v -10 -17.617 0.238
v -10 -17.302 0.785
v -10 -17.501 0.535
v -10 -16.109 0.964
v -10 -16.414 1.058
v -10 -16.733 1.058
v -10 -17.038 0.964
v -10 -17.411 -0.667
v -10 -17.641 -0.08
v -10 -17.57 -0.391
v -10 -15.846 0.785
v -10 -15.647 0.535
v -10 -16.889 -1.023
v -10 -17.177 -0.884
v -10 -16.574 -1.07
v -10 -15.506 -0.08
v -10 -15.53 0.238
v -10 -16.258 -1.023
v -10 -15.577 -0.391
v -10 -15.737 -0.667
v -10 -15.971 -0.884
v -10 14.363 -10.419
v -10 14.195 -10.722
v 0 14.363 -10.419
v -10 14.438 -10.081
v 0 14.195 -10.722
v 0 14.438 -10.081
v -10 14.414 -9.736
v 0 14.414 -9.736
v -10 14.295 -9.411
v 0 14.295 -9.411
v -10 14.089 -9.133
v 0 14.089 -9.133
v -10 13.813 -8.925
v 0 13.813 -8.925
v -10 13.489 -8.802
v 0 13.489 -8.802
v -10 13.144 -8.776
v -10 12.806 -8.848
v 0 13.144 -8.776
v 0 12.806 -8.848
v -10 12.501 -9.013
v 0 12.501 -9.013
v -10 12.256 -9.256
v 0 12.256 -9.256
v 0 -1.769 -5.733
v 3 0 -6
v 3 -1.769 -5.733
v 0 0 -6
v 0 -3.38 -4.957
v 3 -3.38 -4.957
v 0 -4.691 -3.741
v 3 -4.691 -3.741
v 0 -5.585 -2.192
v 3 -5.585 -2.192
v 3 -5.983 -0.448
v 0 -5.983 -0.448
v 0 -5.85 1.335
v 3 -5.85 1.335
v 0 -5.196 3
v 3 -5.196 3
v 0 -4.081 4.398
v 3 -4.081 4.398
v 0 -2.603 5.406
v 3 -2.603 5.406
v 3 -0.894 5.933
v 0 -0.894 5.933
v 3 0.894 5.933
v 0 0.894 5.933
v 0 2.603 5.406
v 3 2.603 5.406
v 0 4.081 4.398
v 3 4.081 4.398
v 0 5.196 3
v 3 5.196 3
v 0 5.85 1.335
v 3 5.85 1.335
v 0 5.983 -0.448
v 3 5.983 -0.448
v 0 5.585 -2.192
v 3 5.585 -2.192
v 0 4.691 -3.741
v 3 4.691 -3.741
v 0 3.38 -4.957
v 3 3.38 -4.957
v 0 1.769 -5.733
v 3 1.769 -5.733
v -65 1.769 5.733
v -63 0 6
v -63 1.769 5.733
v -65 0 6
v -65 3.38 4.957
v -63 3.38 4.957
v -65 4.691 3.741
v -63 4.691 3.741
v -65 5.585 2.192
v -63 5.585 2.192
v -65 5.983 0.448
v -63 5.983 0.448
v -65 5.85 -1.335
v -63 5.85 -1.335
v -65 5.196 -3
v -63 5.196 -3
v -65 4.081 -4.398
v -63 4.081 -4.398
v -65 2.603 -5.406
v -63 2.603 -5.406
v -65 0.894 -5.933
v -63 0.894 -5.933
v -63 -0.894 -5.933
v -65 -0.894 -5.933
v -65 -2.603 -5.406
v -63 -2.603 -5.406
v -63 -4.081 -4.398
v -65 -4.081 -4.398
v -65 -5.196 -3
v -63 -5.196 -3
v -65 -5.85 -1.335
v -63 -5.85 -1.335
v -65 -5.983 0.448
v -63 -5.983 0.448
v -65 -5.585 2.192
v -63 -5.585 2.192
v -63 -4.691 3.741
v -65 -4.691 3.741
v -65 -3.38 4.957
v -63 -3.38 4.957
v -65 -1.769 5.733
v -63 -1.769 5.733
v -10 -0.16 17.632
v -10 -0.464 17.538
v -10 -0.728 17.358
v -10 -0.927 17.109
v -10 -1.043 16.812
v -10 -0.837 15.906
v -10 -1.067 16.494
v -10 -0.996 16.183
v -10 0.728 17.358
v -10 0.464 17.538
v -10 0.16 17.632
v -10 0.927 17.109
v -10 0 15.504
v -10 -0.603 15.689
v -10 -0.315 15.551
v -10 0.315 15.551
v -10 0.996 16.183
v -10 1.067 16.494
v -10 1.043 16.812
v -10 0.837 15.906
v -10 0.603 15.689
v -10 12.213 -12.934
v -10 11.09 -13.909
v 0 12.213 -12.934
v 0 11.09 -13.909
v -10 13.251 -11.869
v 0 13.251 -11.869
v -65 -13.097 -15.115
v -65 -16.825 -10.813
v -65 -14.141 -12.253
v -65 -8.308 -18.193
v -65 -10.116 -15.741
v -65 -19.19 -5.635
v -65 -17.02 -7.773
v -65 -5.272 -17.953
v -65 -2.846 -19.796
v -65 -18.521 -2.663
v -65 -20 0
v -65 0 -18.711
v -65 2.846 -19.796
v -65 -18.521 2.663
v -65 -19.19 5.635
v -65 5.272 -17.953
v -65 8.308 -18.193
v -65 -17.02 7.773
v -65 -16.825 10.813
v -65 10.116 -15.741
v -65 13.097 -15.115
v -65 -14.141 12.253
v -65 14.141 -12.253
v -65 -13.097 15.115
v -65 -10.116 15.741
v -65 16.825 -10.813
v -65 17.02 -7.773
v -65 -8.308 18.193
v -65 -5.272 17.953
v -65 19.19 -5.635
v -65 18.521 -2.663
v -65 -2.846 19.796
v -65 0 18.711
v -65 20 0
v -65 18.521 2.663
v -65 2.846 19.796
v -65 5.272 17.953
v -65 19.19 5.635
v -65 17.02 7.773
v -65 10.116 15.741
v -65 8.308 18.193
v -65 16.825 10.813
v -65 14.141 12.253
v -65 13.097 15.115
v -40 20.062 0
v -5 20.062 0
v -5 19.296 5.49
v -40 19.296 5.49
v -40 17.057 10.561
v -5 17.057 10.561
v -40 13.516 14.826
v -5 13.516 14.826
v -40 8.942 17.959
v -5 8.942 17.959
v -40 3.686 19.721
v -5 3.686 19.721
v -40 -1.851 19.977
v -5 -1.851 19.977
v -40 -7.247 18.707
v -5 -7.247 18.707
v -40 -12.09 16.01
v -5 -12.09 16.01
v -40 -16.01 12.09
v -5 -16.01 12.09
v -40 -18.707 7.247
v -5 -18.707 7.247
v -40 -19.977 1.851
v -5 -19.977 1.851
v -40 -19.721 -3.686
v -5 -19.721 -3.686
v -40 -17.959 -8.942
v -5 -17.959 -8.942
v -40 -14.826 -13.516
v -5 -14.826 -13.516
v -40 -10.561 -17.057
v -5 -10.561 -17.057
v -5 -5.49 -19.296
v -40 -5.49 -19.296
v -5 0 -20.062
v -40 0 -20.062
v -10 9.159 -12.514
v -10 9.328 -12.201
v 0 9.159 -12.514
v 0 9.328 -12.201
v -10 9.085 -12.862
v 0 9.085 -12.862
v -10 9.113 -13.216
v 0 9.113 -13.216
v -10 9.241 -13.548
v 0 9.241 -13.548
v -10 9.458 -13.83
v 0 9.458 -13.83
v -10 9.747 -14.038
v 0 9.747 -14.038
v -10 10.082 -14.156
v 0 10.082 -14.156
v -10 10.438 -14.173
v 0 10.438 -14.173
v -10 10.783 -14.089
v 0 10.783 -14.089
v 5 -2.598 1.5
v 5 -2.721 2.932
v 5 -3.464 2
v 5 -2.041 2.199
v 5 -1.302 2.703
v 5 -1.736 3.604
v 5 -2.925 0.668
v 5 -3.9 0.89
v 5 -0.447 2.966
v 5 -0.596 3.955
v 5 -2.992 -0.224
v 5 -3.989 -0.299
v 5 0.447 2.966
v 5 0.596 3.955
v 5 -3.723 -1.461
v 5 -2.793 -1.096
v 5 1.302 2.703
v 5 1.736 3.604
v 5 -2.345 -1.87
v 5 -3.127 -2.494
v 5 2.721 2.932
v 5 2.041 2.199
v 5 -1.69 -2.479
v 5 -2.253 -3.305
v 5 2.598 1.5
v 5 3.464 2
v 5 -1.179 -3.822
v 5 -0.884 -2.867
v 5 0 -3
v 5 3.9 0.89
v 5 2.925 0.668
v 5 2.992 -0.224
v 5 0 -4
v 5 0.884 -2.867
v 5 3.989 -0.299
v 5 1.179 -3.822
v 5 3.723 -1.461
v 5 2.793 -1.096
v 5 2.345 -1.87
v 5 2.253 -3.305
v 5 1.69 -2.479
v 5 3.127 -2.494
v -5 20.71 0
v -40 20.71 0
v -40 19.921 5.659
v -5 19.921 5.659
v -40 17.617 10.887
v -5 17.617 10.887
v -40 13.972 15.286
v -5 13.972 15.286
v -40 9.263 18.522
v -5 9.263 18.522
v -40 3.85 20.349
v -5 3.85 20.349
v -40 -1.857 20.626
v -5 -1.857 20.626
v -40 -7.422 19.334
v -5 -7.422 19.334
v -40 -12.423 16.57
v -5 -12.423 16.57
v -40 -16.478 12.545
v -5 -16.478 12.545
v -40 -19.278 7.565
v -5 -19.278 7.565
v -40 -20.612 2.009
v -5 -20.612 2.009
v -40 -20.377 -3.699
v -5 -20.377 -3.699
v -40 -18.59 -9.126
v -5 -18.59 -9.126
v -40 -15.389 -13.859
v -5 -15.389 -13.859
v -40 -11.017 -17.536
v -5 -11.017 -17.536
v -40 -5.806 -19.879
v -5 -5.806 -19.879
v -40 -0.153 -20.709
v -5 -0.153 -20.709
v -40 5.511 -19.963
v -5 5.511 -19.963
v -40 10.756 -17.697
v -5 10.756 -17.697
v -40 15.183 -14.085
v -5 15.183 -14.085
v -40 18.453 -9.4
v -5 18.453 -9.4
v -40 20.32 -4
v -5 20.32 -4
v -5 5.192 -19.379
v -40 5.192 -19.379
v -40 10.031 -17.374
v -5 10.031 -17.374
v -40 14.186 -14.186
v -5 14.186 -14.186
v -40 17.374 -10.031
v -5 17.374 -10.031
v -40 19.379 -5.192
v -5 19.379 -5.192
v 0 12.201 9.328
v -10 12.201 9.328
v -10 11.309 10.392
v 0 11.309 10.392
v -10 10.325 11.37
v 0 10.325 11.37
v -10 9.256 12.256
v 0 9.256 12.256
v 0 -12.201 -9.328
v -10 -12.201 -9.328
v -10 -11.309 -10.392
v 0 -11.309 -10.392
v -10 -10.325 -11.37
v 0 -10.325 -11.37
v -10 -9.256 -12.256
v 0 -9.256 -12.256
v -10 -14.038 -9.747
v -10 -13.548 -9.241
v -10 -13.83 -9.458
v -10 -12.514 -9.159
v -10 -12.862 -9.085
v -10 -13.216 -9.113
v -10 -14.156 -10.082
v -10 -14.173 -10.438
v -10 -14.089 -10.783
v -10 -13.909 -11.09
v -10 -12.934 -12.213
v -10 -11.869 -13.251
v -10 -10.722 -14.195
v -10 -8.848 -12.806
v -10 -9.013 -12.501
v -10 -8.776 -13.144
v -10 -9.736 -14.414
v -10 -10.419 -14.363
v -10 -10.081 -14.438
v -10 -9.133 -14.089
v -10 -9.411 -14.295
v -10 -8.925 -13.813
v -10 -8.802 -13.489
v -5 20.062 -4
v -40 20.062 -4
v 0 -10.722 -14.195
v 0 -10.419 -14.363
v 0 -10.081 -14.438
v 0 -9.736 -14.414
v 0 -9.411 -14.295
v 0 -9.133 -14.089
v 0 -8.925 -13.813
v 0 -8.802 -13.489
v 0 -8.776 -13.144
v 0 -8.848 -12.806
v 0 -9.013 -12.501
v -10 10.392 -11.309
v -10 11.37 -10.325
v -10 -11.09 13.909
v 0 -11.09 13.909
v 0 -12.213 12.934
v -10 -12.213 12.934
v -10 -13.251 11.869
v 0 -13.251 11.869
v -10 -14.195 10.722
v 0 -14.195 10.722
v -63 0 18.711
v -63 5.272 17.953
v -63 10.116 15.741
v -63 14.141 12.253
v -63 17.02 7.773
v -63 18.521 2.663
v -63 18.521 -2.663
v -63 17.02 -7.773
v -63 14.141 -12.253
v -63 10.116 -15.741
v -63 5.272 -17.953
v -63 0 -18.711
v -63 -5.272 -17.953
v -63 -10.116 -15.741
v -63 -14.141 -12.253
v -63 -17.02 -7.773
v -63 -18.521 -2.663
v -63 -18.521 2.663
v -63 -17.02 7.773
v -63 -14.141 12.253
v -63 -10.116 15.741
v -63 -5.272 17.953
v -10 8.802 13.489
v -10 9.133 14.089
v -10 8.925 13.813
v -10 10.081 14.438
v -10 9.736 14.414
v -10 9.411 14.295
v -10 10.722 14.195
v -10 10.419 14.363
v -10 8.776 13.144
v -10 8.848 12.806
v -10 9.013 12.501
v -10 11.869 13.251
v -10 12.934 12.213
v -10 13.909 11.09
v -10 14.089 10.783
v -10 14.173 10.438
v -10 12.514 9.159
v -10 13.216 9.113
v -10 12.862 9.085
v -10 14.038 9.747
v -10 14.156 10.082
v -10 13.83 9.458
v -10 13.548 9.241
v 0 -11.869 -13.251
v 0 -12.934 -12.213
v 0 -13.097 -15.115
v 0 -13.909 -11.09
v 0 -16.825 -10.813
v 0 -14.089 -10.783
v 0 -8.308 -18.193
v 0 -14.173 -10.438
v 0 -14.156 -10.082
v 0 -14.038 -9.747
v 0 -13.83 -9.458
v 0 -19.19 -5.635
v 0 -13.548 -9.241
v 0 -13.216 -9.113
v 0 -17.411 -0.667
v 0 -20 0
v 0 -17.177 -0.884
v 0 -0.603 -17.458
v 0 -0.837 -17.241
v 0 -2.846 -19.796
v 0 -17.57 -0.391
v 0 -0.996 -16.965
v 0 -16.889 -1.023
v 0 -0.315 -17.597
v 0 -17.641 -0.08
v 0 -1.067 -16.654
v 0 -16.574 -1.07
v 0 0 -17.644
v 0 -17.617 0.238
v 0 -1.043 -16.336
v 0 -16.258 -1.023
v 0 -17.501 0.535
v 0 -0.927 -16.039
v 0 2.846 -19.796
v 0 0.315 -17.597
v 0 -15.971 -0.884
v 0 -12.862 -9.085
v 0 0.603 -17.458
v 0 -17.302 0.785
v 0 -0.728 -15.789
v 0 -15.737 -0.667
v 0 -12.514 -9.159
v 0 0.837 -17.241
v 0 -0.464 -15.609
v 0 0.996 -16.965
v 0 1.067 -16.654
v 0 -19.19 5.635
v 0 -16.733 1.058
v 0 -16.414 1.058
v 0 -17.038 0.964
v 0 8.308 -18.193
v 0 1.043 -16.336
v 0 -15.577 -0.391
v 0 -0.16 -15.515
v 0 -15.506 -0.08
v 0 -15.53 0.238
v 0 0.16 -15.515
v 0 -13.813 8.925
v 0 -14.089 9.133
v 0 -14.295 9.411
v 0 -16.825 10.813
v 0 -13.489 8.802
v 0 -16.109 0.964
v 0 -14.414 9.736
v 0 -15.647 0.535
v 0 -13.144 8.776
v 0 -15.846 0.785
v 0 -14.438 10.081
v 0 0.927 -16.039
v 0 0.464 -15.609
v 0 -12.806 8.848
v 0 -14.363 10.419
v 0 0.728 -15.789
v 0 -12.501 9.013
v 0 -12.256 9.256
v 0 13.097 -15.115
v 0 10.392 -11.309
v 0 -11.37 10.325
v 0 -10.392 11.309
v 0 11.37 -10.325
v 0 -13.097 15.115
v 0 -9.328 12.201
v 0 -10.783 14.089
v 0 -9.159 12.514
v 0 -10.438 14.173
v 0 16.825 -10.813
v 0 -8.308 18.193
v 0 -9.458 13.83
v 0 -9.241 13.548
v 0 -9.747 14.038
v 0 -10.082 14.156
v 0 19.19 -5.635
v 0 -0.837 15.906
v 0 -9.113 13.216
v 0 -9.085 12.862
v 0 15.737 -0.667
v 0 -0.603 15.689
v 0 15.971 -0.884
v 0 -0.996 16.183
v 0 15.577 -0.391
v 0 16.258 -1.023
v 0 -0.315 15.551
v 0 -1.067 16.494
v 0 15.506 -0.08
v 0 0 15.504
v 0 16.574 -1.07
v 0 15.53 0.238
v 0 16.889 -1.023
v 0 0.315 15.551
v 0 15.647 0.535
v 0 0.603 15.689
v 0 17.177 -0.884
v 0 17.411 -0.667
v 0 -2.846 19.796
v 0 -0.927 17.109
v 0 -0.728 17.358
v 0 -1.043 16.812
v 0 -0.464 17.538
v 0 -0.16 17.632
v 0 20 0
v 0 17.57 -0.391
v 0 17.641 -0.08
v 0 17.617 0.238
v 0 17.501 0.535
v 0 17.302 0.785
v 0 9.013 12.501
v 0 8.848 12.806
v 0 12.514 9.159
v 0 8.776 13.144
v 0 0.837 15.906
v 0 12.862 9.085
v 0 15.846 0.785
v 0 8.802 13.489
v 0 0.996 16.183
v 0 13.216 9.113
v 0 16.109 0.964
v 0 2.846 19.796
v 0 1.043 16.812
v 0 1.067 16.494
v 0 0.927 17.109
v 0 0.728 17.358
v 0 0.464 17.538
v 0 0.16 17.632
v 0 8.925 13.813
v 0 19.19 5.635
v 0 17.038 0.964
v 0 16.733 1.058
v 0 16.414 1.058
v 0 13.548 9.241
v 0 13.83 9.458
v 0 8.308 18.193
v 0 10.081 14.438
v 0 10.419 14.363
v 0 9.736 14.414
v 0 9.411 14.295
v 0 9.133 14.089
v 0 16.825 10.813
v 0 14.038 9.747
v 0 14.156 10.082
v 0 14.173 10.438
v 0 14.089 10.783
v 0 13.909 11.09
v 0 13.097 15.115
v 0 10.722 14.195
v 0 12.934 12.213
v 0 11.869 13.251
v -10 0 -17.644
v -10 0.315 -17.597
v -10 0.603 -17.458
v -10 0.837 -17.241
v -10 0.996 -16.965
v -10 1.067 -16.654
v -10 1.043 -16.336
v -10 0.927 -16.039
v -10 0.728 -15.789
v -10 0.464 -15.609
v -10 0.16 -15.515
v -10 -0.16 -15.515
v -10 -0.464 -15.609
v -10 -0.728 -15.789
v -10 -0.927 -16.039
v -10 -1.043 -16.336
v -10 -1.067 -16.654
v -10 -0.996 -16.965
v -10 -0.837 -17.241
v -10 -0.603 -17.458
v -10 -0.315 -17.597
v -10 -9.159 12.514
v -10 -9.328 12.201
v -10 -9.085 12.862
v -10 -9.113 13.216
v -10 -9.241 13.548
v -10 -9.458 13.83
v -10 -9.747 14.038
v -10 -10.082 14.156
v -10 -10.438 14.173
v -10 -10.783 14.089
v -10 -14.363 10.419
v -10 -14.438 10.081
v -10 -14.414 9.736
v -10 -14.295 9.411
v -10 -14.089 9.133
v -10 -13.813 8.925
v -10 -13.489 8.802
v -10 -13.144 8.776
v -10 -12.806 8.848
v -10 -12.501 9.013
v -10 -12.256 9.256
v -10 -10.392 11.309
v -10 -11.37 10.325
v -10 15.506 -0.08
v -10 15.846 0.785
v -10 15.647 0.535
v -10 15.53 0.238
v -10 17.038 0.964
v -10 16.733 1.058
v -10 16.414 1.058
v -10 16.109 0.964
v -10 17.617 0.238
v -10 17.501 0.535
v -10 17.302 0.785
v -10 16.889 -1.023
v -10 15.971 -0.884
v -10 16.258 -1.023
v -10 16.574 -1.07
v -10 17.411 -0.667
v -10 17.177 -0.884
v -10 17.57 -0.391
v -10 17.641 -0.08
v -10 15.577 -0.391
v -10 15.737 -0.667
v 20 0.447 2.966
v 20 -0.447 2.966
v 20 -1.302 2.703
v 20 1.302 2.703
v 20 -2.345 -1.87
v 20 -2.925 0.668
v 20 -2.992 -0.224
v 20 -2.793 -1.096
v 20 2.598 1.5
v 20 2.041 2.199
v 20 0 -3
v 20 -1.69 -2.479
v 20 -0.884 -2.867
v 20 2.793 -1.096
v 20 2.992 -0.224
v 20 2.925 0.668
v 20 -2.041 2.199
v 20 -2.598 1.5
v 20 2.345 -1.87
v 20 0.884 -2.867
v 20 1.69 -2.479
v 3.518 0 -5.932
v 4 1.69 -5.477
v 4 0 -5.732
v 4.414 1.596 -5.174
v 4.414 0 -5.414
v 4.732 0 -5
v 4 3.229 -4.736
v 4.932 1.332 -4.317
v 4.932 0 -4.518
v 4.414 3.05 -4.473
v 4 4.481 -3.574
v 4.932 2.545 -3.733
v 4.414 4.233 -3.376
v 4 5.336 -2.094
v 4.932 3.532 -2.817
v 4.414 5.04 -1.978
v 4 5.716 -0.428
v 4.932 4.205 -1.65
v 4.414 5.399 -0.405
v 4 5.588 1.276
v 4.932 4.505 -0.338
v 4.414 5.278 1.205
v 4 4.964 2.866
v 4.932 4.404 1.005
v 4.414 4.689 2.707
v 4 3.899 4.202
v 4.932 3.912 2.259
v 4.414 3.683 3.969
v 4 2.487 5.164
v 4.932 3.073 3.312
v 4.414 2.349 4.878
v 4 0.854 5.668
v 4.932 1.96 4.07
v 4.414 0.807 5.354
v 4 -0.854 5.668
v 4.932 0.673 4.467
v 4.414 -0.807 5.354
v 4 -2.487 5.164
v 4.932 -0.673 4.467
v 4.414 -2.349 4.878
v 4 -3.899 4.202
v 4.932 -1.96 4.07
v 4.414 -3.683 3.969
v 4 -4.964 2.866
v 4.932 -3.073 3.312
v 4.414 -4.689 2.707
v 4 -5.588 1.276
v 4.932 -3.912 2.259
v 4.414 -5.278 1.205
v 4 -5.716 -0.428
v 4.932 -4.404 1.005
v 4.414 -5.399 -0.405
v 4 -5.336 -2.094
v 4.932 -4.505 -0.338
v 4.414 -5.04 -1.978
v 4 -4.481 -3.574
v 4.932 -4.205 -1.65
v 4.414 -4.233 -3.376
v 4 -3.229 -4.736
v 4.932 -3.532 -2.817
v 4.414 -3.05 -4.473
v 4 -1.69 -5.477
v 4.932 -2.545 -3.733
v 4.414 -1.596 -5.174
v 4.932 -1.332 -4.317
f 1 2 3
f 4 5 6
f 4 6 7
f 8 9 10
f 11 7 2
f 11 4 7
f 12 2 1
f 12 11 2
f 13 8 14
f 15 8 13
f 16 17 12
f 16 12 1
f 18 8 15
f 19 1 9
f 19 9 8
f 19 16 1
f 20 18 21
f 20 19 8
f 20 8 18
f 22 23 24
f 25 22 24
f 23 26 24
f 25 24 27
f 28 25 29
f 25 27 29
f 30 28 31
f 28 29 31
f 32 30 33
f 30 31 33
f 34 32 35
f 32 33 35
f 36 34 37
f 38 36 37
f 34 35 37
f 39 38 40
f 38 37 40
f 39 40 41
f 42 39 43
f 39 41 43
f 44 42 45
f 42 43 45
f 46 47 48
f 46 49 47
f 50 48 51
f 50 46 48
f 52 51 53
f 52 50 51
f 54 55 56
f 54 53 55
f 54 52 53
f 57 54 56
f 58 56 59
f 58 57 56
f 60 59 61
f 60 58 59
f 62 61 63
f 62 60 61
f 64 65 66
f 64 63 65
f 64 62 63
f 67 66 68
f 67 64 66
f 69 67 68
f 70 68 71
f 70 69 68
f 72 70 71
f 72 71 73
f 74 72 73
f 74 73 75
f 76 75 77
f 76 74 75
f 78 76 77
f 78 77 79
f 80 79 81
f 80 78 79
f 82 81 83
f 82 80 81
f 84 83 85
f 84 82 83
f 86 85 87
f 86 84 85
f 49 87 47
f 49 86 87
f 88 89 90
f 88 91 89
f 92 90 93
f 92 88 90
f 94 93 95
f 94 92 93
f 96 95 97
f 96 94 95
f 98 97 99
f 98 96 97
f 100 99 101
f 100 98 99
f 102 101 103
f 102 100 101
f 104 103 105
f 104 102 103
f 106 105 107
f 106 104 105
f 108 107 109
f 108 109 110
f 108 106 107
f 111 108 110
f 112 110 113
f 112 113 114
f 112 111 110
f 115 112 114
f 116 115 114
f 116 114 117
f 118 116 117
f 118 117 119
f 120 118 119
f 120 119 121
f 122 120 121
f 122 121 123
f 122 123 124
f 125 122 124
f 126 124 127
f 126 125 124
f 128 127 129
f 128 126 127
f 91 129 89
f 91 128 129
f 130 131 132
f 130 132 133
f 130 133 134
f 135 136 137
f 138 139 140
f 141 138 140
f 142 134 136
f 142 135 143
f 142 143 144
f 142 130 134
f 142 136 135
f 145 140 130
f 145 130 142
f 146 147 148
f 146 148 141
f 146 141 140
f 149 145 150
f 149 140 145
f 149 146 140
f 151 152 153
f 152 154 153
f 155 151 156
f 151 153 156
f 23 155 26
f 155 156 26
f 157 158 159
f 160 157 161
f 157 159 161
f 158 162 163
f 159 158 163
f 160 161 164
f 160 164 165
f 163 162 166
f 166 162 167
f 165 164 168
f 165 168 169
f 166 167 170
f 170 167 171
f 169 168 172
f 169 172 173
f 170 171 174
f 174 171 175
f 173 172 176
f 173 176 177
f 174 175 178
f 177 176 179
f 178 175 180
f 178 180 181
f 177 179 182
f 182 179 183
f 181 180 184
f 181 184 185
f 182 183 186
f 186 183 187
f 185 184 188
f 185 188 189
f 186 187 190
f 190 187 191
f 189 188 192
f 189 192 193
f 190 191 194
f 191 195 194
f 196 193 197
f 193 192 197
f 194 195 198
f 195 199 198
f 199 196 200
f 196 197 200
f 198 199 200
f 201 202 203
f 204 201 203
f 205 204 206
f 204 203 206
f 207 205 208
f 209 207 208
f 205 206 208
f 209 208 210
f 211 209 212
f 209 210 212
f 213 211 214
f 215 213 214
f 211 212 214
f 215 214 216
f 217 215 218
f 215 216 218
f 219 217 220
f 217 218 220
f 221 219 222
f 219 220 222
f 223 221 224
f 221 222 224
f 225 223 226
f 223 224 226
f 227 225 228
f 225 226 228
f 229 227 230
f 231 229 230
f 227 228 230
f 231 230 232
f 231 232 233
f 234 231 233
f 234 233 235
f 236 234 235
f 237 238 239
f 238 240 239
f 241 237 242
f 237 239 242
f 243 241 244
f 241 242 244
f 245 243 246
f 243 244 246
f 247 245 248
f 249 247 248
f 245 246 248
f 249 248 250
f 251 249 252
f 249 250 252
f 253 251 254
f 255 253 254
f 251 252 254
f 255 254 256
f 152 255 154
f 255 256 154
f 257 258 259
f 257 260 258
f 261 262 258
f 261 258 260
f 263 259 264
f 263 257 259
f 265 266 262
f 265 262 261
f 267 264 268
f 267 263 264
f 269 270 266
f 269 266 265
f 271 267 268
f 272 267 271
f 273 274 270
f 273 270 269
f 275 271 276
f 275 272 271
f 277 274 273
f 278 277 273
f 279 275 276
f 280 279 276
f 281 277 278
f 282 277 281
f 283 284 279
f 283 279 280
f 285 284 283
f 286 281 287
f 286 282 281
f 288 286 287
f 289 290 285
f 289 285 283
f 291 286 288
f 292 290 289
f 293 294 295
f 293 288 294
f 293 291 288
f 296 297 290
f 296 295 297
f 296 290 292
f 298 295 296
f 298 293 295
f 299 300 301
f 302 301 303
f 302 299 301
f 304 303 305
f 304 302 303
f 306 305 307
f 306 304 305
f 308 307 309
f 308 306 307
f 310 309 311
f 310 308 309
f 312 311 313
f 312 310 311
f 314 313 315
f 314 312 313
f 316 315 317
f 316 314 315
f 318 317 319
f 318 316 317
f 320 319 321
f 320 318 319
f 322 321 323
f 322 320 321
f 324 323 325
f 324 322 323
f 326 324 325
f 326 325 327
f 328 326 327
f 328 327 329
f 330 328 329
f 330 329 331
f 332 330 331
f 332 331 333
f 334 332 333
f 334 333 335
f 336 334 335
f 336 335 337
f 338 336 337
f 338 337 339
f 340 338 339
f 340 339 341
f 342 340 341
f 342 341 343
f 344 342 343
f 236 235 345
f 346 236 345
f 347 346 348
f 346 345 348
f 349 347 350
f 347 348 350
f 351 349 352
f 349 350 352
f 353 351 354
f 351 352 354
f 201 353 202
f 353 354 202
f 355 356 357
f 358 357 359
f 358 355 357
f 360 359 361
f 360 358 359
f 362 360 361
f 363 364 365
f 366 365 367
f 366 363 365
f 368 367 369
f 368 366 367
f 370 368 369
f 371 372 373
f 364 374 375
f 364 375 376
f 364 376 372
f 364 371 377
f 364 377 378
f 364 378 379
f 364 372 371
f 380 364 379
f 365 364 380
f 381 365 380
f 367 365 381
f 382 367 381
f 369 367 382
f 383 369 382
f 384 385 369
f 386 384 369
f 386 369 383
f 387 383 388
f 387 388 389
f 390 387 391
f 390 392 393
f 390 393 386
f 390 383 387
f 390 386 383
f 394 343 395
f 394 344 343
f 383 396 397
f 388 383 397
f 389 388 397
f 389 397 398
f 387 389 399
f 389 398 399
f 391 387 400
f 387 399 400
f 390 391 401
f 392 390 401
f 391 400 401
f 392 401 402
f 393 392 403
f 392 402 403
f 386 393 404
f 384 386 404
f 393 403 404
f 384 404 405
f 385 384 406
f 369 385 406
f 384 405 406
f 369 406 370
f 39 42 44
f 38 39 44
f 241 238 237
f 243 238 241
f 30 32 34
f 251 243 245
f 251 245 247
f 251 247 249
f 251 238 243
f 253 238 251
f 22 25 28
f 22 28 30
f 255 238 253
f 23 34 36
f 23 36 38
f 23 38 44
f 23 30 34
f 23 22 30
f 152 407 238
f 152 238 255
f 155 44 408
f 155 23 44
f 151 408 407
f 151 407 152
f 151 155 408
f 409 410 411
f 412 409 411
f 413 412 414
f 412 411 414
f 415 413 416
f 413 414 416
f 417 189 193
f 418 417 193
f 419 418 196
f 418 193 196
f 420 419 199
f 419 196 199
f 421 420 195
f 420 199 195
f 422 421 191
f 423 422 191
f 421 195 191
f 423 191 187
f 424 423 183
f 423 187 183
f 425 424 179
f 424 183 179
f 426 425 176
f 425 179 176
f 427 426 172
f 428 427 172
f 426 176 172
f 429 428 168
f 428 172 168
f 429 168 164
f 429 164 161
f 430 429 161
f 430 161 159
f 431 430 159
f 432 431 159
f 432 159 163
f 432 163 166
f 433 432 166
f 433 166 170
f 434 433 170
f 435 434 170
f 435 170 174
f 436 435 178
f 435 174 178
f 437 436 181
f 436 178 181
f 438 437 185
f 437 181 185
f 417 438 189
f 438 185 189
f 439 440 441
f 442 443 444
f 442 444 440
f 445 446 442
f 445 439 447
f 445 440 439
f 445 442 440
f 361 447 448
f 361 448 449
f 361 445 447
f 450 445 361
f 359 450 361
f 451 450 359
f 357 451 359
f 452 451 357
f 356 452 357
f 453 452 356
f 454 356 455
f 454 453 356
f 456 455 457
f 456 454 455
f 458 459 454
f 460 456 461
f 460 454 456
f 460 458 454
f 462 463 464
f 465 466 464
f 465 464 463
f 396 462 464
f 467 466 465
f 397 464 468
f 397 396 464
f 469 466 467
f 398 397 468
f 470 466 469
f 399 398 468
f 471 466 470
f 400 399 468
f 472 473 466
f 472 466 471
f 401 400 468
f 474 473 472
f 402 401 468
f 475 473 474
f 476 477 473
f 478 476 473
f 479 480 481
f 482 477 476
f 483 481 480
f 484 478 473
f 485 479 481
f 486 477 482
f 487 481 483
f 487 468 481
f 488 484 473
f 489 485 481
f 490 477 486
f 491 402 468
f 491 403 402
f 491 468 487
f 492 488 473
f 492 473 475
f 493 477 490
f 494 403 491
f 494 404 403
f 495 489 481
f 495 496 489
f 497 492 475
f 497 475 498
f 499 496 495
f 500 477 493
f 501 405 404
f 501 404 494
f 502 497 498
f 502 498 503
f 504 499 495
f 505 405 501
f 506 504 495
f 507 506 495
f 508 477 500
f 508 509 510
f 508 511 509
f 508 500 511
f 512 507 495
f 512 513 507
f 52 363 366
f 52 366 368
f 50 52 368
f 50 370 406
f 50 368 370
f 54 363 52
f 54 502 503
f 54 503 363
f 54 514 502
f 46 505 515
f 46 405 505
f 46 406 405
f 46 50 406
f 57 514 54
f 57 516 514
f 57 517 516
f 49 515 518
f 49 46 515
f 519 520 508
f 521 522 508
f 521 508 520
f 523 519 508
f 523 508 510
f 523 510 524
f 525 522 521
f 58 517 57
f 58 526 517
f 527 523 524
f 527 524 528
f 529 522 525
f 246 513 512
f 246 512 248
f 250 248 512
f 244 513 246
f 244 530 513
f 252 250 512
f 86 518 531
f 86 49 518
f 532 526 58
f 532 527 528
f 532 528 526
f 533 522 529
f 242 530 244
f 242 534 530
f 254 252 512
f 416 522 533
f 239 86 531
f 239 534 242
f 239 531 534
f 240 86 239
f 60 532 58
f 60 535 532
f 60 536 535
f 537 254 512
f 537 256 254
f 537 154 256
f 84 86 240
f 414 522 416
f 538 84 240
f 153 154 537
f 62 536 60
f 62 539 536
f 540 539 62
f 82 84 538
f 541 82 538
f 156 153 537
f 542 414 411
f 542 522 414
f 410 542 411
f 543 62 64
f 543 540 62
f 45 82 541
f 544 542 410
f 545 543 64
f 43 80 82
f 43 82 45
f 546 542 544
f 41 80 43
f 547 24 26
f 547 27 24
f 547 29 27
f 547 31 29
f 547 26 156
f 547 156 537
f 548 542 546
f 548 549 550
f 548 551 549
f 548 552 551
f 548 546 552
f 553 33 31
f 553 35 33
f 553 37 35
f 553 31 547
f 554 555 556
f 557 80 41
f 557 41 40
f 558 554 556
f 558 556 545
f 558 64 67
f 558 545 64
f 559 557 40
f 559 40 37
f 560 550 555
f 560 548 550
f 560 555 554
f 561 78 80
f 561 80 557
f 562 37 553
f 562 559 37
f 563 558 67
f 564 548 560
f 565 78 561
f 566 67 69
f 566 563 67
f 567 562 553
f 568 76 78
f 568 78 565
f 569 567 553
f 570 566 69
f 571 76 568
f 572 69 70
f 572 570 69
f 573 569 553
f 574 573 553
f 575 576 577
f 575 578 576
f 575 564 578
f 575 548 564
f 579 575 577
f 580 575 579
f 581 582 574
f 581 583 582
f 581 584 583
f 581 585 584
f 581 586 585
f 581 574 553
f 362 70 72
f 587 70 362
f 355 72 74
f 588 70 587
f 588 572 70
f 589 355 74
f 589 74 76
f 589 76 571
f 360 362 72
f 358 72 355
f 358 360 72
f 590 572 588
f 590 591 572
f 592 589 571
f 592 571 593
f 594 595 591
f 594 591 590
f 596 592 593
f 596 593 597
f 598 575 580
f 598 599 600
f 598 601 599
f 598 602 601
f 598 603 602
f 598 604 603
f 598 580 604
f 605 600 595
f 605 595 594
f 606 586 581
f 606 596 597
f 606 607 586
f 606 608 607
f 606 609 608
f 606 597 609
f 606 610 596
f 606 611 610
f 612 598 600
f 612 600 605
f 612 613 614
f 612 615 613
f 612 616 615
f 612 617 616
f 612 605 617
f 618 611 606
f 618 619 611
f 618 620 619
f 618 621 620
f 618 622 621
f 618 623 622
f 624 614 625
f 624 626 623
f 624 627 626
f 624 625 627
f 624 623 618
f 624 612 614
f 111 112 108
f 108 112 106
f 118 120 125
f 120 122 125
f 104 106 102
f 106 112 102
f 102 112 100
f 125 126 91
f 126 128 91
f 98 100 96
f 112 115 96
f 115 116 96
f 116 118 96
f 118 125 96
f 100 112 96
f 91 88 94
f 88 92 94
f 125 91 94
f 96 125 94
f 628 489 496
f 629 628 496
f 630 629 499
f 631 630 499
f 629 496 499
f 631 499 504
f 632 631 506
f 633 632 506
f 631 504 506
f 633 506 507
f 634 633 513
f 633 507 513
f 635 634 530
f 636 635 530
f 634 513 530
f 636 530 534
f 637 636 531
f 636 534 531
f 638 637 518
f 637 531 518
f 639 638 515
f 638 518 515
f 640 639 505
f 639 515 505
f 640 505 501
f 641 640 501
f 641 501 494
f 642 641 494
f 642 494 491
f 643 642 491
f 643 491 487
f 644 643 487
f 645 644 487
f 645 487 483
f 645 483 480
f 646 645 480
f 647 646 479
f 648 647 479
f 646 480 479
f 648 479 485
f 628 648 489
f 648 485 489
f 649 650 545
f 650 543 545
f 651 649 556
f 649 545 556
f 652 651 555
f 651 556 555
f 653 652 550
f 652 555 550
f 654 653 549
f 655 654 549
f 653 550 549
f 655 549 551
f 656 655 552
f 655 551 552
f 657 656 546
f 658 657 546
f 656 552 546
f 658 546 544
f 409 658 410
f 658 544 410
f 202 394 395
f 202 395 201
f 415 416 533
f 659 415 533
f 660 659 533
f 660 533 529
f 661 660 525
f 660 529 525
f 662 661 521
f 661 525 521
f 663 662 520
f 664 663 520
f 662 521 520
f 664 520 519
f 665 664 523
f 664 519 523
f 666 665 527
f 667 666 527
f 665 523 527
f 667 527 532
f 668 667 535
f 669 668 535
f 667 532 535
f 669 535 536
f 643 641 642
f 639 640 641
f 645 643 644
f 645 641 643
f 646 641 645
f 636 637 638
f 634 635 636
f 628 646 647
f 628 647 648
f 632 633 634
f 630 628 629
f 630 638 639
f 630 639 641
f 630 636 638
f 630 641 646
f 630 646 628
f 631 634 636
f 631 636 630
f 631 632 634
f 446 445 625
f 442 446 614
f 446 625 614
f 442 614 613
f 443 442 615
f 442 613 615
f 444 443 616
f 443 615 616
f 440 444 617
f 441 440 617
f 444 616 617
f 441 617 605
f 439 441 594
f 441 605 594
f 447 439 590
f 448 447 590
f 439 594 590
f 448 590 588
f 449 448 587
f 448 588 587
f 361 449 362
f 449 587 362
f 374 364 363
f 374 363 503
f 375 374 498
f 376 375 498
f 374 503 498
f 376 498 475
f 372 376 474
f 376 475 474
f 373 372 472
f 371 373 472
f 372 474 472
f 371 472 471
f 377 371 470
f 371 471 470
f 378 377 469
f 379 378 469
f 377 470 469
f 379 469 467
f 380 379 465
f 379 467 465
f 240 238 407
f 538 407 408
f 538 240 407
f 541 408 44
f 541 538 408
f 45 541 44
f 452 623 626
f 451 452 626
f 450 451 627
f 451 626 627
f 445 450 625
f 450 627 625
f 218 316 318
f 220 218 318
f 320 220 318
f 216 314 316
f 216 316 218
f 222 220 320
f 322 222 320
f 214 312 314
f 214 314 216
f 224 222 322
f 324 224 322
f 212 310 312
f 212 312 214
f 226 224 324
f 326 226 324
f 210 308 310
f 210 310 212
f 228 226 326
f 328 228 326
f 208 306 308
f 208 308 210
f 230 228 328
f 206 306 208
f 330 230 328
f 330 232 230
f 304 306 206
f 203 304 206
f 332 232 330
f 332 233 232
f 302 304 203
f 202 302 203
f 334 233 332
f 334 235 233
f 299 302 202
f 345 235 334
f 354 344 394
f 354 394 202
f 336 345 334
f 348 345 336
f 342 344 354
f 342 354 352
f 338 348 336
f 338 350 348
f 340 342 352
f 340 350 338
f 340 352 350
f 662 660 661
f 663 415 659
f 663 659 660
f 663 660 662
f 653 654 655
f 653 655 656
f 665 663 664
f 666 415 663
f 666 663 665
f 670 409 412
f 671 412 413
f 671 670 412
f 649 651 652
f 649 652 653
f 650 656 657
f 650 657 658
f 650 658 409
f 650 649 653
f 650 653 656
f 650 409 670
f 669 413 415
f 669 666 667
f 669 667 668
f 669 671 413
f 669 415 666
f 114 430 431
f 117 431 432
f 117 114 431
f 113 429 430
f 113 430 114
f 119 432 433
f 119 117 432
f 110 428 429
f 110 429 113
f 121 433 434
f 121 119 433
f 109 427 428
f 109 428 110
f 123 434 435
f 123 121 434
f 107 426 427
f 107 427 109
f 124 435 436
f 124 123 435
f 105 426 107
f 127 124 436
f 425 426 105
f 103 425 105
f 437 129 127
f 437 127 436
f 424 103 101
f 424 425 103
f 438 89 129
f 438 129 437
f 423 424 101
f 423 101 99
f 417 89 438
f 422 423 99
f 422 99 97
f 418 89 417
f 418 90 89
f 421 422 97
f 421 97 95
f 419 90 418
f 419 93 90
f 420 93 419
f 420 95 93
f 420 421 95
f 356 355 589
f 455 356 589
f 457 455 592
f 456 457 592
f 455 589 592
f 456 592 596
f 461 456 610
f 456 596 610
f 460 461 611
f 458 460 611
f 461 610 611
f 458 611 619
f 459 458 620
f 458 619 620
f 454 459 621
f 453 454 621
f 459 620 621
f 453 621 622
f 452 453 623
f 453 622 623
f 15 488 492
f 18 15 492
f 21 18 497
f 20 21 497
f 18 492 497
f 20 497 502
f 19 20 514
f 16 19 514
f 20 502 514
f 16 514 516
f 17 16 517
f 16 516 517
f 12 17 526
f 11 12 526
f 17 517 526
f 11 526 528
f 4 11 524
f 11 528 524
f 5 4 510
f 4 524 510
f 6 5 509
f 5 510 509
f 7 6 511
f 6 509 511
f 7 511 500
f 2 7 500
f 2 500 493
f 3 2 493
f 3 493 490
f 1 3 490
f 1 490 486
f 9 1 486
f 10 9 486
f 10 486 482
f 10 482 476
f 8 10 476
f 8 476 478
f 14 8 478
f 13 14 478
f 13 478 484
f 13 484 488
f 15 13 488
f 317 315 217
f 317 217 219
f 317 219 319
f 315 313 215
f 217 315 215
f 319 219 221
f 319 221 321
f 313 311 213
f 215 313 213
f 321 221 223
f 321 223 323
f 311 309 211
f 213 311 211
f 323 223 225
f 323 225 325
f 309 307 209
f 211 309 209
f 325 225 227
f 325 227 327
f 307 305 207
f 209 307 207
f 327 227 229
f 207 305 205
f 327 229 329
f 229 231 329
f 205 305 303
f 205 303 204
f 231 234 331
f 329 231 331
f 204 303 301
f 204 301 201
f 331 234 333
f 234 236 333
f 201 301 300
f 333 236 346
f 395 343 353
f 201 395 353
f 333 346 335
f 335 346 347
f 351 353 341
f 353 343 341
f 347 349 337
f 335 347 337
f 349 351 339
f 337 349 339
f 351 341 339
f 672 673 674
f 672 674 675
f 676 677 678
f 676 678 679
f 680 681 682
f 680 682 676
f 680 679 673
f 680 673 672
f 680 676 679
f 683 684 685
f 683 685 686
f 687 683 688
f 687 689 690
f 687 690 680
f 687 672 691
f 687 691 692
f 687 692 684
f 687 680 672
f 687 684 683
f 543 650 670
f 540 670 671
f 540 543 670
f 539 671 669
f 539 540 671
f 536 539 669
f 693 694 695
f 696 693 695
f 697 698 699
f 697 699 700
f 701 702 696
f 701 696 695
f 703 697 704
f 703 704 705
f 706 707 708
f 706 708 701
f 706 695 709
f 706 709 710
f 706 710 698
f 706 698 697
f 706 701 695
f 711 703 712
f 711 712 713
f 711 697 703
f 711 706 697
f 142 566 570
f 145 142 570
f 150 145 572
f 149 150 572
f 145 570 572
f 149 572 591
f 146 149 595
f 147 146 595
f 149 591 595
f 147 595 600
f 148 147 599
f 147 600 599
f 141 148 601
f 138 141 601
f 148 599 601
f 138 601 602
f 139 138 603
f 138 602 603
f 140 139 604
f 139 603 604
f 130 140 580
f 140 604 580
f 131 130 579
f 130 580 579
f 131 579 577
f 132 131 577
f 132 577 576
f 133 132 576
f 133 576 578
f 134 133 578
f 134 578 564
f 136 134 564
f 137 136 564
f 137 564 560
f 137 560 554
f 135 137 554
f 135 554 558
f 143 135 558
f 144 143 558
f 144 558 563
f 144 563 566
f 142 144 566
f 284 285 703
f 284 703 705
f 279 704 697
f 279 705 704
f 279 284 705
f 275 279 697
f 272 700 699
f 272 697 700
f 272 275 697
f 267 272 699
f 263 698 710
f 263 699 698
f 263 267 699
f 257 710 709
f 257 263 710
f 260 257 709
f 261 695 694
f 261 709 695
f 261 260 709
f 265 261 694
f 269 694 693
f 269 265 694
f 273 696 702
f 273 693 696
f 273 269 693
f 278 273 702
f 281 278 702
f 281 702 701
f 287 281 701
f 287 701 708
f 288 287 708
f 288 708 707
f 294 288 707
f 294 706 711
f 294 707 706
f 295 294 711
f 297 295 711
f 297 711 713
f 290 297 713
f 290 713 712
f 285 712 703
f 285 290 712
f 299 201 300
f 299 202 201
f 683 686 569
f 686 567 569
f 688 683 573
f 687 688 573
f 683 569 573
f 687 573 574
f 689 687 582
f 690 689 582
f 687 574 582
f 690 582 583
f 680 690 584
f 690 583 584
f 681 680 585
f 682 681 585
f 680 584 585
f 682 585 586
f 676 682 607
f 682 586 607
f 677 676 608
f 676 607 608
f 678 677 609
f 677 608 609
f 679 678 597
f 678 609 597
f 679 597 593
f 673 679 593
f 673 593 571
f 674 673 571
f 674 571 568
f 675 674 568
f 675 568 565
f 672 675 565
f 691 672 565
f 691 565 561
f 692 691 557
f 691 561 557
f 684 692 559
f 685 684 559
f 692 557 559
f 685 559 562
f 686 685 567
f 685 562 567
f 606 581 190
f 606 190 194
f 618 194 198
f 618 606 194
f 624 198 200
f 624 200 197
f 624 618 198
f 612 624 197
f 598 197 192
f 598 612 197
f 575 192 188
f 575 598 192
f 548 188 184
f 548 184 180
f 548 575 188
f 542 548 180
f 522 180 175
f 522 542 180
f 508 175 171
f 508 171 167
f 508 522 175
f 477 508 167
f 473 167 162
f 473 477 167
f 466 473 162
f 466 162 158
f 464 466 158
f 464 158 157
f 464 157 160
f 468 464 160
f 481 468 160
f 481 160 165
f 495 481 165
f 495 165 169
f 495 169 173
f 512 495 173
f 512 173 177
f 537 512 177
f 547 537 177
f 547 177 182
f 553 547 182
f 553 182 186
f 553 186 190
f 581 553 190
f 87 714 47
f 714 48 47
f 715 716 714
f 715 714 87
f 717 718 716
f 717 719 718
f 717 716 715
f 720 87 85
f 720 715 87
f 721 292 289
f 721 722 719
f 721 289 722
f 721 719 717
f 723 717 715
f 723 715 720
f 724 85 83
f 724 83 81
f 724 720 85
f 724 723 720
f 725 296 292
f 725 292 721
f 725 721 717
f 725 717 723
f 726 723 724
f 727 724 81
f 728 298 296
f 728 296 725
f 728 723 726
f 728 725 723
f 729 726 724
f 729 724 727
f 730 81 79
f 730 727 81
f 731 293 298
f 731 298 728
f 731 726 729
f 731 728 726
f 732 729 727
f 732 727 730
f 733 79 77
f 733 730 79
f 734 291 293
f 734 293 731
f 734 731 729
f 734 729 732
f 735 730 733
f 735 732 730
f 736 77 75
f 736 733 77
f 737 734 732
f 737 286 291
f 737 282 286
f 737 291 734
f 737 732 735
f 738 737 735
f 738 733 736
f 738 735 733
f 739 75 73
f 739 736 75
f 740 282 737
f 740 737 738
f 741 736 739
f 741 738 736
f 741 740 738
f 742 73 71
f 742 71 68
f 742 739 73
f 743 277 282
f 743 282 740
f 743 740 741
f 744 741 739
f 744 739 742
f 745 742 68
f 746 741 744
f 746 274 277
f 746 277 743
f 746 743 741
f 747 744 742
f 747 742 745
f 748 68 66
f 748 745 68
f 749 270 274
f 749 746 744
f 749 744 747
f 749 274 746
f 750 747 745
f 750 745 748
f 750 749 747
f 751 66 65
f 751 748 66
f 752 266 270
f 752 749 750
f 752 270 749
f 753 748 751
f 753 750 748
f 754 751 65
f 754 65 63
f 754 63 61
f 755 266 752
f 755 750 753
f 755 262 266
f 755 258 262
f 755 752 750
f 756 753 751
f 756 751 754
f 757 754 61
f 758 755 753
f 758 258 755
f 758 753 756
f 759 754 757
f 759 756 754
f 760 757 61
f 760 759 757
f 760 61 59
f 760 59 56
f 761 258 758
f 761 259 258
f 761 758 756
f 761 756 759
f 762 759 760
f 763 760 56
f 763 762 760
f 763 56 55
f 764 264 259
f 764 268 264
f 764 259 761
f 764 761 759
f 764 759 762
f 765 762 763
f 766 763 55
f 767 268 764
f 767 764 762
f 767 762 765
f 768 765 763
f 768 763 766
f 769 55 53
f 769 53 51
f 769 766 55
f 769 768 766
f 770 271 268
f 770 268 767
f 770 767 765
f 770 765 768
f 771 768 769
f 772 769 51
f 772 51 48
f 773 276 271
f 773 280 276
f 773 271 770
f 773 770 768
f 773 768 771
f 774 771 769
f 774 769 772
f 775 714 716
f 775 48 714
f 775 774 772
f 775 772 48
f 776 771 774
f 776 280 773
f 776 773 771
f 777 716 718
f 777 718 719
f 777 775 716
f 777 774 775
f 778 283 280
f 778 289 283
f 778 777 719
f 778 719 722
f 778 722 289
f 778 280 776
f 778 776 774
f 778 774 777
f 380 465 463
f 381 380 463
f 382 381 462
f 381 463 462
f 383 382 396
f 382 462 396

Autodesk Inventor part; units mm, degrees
ref_plane "YZ Plane" through (0, 0, 0) normal (1, 0, 0) x (0, 1, 0)
ref_plane "XZ Plane" through (0, 0, 0) normal (0, 1, 0) x (-1, 0, 0)
ref_plane "XY Plane" through (0, 0, 0) normal (0, 0, 1) x (1, 0, 0)
sketch "Sketch1" plane through (0, 0, 0) normal (1, 0, 0) x (0, 1, 0)
  circle A0 centre (0, 0) radius 20
  dimension "d0" = 40
extrude "Extrusion1" add sketch "Sketch1" against normal blind 65
sketch "Sketch2" plane through (0, 0, 0) normal (1, 0, 0) x (0, 0, -1)
  circle A0 centre (0, 0) radius 6
  circle A1 centre (0, 0) radius 3
  dimension "d3" = 12
  dimension "d4" = 6
extrude "Extrusion2" add sketch "Sketch2" along normal blind 5
fillet "Fillet1" radius 2 1 edges at (5, 0, 6)
sketch "Sketch3" plane through (0, 0, 0) normal (1, 0, 0) x (0, 0, -1)
  circle A0 centre (0, 0) radius 20.7096
  circle A1 centre (0, 0) radius 20.0622
extrude "Extrusion3" add sketch "Sketch3" against normal blind 40
sketch "Sketch4" plane through (0, 0, 0) normal (1, 0, 0) x (0, 0, -1)
  circle A0 centre (0, 0) radius 20.0395
  circle A1 centre (0, 0) radius 20.0395
  circle A2 centre (0, 0) radius 20.7096
extrude "Extrusion4" cut sketch "Sketch4" against normal blind 5
sketch "Sketch5" plane through (-5, 0, 0) normal (1, 0, 0) x (0, 0, -1)
  circle A0 centre (0, 0) radius 20.0622 projected
  circle A1 centre (0, 0) radius 20.7096 projected
  line L0 (0, 20.0622) -> (0, 20.7096)
  line L1 (0, 20.7096) -> (4, 20.7096)
  line L2 (4, 20.7096) -> (4, 20.0622)
  line L3 (4, 20.0622) -> (0, 20.0622)
  dimension "d12" = 4
extrude "Extrusion5" cut sketch "Sketch5" against normal through all contours L0 A1 L2 L3 | L1 L2 A1 picked at (2.2253, 20.2201)
sketch "Sketch6" plane through (0, 0, 0) normal (1, 0, 0) x (0, 0, -1)
  circle A0 centre (0, 0) radius 17.7894
  circle A1 centre (0, 0) radius 15.3585
  arc A2 (-10.7216, -14.1954) -> (-9.2565, -12.2556) centre (-9.989, -13.2255) ccw
  arc A3 (-11.811, -9.8174) -> (-13.9091, -11.0905) centre (-12.9418, -10.3192) ccw
  arc A4 (-14.1954, 10.7216) -> (-12.2556, 9.2565) centre (-13.2255, 9.989) ccw
  arc A5 (-9.8174, 11.811) -> (-11.0905, 13.9091) centre (-10.3192, 12.9418) ccw
  arc A6 (10.7216, 14.1954) -> (9.2565, 12.2556) centre (9.989, 13.2255) ccw
  arc A7 (11.811, 9.8174) -> (13.9091, 11.0905) centre (12.9418, 10.3192) ccw
  arc A8 (14.1954, -10.7216) -> (12.2556, -9.2565) centre (13.2255, -9.989) ccw
  arc A9 (9.8174, -11.811) -> (11.0905, -13.9091) centre (10.3192, -12.9418) ccw
  circle A10 centre (0, -16.5738) radius 1.0703
  circle A11 centre (16.5738, 0) radius 1.0703
  circle A12 centre (0, 16.5738) radius 1.0703
  circle A13 centre (-16.5738, 0) radius 1.0703
  point P0 (9.3285, -12.2009)
  point P1 (14.1954, -10.7216)
  point P2 (12.2556, -9.2565)
  point P3 (12.2009, 9.3285)
  point P4 (10.7216, 14.1954)
  point P5 (9.2565, 12.2556)
  point P6 (-9.3285, 12.2009)
  point P7 (-11.0905, 13.9091)
  point P8 (-14.1954, 10.7216)
  point P9 (-12.2009, -9.3285)
  dimension "d17" = 360
  dimension "d21" = 360
extrude "Extrusion6" cut sketch "Sketch6" against normal blind 10 contours A7 A1 A6 A0 | A0 A9 A1 A8 | A5 A1 A4 A0 | A0 A3 A1 A2 | A10 | A11 | A12 | A13
sketch3d "3D Sketch1"
sketch "Sketch8" plane through (-65, 0, 0) normal (-1, 0, 0) x (0, 0, 1)
  circle A0 centre (0, 0) radius 18.7114
  circle A1 centre (0, 0) radius 6 projected
  circle A2 centre (0, 0) radius 5
extrude "Extrusion7" cut sketch "Sketch8" against normal blind 2 contours A0
sketch "Sketch9" plane through (0, 0, 0) normal (1, 0, 0) x (0, 0, -1)
  circle A0 centre (0, 0) radius 3 projected
  circle A1 centre (0, 0) radius 5
  circle A2 centre (0, 0) radius 3
extrude "Extrusion8" add sketch "Sketch9" along normal blind 20 contours A0
properties part number "775motor"
